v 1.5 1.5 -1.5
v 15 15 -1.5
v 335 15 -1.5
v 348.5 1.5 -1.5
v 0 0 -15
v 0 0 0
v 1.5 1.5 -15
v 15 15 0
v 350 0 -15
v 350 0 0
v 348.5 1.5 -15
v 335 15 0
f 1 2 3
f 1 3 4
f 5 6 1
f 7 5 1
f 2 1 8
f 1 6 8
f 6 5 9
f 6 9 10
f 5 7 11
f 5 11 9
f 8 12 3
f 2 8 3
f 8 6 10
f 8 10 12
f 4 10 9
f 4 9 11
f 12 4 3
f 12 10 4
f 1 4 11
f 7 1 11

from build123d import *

# Parameters (mm, degrees)
EXTRUDE_1_DEPTH     = 350
CUT_EXTRUDE_1_DEPTH = 16


with BuildPart() as part:
    # Эскиз1 → Бобышка-Вытянуть1 (new body)
    with BuildSketch(Plane(origin=(0, 0, 0), x_dir=(0, 0, -1), z_dir=(1, 0, 0))):
        Polygon((0, 0), (0, 15), (1.5, 15), (1.5, 1.5), (15, 1.5), (15, 0), align=None)
    extrude(amount=EXTRUDE_1_DEPTH)

    # Эскиз2 → Вырез-Вытянуть1 (cut, through all)
    with BuildSketch(Plane.XY):
        Polygon((0, 0), (21.729873861, 21.729873861), (0, 21.729873861), align=None)
    cut_extrude_1 = extrude(amount=-CUT_EXTRUDE_1_DEPTH, mode=Mode.SUBTRACT)

    # Зеркальное отражение1: Вырез-Вытянуть1 across plane
    add(cut_extrude_1.mirror(Plane.ZY.offset(-175)), mode=Mode.SUBTRACT)


solid = part.part
